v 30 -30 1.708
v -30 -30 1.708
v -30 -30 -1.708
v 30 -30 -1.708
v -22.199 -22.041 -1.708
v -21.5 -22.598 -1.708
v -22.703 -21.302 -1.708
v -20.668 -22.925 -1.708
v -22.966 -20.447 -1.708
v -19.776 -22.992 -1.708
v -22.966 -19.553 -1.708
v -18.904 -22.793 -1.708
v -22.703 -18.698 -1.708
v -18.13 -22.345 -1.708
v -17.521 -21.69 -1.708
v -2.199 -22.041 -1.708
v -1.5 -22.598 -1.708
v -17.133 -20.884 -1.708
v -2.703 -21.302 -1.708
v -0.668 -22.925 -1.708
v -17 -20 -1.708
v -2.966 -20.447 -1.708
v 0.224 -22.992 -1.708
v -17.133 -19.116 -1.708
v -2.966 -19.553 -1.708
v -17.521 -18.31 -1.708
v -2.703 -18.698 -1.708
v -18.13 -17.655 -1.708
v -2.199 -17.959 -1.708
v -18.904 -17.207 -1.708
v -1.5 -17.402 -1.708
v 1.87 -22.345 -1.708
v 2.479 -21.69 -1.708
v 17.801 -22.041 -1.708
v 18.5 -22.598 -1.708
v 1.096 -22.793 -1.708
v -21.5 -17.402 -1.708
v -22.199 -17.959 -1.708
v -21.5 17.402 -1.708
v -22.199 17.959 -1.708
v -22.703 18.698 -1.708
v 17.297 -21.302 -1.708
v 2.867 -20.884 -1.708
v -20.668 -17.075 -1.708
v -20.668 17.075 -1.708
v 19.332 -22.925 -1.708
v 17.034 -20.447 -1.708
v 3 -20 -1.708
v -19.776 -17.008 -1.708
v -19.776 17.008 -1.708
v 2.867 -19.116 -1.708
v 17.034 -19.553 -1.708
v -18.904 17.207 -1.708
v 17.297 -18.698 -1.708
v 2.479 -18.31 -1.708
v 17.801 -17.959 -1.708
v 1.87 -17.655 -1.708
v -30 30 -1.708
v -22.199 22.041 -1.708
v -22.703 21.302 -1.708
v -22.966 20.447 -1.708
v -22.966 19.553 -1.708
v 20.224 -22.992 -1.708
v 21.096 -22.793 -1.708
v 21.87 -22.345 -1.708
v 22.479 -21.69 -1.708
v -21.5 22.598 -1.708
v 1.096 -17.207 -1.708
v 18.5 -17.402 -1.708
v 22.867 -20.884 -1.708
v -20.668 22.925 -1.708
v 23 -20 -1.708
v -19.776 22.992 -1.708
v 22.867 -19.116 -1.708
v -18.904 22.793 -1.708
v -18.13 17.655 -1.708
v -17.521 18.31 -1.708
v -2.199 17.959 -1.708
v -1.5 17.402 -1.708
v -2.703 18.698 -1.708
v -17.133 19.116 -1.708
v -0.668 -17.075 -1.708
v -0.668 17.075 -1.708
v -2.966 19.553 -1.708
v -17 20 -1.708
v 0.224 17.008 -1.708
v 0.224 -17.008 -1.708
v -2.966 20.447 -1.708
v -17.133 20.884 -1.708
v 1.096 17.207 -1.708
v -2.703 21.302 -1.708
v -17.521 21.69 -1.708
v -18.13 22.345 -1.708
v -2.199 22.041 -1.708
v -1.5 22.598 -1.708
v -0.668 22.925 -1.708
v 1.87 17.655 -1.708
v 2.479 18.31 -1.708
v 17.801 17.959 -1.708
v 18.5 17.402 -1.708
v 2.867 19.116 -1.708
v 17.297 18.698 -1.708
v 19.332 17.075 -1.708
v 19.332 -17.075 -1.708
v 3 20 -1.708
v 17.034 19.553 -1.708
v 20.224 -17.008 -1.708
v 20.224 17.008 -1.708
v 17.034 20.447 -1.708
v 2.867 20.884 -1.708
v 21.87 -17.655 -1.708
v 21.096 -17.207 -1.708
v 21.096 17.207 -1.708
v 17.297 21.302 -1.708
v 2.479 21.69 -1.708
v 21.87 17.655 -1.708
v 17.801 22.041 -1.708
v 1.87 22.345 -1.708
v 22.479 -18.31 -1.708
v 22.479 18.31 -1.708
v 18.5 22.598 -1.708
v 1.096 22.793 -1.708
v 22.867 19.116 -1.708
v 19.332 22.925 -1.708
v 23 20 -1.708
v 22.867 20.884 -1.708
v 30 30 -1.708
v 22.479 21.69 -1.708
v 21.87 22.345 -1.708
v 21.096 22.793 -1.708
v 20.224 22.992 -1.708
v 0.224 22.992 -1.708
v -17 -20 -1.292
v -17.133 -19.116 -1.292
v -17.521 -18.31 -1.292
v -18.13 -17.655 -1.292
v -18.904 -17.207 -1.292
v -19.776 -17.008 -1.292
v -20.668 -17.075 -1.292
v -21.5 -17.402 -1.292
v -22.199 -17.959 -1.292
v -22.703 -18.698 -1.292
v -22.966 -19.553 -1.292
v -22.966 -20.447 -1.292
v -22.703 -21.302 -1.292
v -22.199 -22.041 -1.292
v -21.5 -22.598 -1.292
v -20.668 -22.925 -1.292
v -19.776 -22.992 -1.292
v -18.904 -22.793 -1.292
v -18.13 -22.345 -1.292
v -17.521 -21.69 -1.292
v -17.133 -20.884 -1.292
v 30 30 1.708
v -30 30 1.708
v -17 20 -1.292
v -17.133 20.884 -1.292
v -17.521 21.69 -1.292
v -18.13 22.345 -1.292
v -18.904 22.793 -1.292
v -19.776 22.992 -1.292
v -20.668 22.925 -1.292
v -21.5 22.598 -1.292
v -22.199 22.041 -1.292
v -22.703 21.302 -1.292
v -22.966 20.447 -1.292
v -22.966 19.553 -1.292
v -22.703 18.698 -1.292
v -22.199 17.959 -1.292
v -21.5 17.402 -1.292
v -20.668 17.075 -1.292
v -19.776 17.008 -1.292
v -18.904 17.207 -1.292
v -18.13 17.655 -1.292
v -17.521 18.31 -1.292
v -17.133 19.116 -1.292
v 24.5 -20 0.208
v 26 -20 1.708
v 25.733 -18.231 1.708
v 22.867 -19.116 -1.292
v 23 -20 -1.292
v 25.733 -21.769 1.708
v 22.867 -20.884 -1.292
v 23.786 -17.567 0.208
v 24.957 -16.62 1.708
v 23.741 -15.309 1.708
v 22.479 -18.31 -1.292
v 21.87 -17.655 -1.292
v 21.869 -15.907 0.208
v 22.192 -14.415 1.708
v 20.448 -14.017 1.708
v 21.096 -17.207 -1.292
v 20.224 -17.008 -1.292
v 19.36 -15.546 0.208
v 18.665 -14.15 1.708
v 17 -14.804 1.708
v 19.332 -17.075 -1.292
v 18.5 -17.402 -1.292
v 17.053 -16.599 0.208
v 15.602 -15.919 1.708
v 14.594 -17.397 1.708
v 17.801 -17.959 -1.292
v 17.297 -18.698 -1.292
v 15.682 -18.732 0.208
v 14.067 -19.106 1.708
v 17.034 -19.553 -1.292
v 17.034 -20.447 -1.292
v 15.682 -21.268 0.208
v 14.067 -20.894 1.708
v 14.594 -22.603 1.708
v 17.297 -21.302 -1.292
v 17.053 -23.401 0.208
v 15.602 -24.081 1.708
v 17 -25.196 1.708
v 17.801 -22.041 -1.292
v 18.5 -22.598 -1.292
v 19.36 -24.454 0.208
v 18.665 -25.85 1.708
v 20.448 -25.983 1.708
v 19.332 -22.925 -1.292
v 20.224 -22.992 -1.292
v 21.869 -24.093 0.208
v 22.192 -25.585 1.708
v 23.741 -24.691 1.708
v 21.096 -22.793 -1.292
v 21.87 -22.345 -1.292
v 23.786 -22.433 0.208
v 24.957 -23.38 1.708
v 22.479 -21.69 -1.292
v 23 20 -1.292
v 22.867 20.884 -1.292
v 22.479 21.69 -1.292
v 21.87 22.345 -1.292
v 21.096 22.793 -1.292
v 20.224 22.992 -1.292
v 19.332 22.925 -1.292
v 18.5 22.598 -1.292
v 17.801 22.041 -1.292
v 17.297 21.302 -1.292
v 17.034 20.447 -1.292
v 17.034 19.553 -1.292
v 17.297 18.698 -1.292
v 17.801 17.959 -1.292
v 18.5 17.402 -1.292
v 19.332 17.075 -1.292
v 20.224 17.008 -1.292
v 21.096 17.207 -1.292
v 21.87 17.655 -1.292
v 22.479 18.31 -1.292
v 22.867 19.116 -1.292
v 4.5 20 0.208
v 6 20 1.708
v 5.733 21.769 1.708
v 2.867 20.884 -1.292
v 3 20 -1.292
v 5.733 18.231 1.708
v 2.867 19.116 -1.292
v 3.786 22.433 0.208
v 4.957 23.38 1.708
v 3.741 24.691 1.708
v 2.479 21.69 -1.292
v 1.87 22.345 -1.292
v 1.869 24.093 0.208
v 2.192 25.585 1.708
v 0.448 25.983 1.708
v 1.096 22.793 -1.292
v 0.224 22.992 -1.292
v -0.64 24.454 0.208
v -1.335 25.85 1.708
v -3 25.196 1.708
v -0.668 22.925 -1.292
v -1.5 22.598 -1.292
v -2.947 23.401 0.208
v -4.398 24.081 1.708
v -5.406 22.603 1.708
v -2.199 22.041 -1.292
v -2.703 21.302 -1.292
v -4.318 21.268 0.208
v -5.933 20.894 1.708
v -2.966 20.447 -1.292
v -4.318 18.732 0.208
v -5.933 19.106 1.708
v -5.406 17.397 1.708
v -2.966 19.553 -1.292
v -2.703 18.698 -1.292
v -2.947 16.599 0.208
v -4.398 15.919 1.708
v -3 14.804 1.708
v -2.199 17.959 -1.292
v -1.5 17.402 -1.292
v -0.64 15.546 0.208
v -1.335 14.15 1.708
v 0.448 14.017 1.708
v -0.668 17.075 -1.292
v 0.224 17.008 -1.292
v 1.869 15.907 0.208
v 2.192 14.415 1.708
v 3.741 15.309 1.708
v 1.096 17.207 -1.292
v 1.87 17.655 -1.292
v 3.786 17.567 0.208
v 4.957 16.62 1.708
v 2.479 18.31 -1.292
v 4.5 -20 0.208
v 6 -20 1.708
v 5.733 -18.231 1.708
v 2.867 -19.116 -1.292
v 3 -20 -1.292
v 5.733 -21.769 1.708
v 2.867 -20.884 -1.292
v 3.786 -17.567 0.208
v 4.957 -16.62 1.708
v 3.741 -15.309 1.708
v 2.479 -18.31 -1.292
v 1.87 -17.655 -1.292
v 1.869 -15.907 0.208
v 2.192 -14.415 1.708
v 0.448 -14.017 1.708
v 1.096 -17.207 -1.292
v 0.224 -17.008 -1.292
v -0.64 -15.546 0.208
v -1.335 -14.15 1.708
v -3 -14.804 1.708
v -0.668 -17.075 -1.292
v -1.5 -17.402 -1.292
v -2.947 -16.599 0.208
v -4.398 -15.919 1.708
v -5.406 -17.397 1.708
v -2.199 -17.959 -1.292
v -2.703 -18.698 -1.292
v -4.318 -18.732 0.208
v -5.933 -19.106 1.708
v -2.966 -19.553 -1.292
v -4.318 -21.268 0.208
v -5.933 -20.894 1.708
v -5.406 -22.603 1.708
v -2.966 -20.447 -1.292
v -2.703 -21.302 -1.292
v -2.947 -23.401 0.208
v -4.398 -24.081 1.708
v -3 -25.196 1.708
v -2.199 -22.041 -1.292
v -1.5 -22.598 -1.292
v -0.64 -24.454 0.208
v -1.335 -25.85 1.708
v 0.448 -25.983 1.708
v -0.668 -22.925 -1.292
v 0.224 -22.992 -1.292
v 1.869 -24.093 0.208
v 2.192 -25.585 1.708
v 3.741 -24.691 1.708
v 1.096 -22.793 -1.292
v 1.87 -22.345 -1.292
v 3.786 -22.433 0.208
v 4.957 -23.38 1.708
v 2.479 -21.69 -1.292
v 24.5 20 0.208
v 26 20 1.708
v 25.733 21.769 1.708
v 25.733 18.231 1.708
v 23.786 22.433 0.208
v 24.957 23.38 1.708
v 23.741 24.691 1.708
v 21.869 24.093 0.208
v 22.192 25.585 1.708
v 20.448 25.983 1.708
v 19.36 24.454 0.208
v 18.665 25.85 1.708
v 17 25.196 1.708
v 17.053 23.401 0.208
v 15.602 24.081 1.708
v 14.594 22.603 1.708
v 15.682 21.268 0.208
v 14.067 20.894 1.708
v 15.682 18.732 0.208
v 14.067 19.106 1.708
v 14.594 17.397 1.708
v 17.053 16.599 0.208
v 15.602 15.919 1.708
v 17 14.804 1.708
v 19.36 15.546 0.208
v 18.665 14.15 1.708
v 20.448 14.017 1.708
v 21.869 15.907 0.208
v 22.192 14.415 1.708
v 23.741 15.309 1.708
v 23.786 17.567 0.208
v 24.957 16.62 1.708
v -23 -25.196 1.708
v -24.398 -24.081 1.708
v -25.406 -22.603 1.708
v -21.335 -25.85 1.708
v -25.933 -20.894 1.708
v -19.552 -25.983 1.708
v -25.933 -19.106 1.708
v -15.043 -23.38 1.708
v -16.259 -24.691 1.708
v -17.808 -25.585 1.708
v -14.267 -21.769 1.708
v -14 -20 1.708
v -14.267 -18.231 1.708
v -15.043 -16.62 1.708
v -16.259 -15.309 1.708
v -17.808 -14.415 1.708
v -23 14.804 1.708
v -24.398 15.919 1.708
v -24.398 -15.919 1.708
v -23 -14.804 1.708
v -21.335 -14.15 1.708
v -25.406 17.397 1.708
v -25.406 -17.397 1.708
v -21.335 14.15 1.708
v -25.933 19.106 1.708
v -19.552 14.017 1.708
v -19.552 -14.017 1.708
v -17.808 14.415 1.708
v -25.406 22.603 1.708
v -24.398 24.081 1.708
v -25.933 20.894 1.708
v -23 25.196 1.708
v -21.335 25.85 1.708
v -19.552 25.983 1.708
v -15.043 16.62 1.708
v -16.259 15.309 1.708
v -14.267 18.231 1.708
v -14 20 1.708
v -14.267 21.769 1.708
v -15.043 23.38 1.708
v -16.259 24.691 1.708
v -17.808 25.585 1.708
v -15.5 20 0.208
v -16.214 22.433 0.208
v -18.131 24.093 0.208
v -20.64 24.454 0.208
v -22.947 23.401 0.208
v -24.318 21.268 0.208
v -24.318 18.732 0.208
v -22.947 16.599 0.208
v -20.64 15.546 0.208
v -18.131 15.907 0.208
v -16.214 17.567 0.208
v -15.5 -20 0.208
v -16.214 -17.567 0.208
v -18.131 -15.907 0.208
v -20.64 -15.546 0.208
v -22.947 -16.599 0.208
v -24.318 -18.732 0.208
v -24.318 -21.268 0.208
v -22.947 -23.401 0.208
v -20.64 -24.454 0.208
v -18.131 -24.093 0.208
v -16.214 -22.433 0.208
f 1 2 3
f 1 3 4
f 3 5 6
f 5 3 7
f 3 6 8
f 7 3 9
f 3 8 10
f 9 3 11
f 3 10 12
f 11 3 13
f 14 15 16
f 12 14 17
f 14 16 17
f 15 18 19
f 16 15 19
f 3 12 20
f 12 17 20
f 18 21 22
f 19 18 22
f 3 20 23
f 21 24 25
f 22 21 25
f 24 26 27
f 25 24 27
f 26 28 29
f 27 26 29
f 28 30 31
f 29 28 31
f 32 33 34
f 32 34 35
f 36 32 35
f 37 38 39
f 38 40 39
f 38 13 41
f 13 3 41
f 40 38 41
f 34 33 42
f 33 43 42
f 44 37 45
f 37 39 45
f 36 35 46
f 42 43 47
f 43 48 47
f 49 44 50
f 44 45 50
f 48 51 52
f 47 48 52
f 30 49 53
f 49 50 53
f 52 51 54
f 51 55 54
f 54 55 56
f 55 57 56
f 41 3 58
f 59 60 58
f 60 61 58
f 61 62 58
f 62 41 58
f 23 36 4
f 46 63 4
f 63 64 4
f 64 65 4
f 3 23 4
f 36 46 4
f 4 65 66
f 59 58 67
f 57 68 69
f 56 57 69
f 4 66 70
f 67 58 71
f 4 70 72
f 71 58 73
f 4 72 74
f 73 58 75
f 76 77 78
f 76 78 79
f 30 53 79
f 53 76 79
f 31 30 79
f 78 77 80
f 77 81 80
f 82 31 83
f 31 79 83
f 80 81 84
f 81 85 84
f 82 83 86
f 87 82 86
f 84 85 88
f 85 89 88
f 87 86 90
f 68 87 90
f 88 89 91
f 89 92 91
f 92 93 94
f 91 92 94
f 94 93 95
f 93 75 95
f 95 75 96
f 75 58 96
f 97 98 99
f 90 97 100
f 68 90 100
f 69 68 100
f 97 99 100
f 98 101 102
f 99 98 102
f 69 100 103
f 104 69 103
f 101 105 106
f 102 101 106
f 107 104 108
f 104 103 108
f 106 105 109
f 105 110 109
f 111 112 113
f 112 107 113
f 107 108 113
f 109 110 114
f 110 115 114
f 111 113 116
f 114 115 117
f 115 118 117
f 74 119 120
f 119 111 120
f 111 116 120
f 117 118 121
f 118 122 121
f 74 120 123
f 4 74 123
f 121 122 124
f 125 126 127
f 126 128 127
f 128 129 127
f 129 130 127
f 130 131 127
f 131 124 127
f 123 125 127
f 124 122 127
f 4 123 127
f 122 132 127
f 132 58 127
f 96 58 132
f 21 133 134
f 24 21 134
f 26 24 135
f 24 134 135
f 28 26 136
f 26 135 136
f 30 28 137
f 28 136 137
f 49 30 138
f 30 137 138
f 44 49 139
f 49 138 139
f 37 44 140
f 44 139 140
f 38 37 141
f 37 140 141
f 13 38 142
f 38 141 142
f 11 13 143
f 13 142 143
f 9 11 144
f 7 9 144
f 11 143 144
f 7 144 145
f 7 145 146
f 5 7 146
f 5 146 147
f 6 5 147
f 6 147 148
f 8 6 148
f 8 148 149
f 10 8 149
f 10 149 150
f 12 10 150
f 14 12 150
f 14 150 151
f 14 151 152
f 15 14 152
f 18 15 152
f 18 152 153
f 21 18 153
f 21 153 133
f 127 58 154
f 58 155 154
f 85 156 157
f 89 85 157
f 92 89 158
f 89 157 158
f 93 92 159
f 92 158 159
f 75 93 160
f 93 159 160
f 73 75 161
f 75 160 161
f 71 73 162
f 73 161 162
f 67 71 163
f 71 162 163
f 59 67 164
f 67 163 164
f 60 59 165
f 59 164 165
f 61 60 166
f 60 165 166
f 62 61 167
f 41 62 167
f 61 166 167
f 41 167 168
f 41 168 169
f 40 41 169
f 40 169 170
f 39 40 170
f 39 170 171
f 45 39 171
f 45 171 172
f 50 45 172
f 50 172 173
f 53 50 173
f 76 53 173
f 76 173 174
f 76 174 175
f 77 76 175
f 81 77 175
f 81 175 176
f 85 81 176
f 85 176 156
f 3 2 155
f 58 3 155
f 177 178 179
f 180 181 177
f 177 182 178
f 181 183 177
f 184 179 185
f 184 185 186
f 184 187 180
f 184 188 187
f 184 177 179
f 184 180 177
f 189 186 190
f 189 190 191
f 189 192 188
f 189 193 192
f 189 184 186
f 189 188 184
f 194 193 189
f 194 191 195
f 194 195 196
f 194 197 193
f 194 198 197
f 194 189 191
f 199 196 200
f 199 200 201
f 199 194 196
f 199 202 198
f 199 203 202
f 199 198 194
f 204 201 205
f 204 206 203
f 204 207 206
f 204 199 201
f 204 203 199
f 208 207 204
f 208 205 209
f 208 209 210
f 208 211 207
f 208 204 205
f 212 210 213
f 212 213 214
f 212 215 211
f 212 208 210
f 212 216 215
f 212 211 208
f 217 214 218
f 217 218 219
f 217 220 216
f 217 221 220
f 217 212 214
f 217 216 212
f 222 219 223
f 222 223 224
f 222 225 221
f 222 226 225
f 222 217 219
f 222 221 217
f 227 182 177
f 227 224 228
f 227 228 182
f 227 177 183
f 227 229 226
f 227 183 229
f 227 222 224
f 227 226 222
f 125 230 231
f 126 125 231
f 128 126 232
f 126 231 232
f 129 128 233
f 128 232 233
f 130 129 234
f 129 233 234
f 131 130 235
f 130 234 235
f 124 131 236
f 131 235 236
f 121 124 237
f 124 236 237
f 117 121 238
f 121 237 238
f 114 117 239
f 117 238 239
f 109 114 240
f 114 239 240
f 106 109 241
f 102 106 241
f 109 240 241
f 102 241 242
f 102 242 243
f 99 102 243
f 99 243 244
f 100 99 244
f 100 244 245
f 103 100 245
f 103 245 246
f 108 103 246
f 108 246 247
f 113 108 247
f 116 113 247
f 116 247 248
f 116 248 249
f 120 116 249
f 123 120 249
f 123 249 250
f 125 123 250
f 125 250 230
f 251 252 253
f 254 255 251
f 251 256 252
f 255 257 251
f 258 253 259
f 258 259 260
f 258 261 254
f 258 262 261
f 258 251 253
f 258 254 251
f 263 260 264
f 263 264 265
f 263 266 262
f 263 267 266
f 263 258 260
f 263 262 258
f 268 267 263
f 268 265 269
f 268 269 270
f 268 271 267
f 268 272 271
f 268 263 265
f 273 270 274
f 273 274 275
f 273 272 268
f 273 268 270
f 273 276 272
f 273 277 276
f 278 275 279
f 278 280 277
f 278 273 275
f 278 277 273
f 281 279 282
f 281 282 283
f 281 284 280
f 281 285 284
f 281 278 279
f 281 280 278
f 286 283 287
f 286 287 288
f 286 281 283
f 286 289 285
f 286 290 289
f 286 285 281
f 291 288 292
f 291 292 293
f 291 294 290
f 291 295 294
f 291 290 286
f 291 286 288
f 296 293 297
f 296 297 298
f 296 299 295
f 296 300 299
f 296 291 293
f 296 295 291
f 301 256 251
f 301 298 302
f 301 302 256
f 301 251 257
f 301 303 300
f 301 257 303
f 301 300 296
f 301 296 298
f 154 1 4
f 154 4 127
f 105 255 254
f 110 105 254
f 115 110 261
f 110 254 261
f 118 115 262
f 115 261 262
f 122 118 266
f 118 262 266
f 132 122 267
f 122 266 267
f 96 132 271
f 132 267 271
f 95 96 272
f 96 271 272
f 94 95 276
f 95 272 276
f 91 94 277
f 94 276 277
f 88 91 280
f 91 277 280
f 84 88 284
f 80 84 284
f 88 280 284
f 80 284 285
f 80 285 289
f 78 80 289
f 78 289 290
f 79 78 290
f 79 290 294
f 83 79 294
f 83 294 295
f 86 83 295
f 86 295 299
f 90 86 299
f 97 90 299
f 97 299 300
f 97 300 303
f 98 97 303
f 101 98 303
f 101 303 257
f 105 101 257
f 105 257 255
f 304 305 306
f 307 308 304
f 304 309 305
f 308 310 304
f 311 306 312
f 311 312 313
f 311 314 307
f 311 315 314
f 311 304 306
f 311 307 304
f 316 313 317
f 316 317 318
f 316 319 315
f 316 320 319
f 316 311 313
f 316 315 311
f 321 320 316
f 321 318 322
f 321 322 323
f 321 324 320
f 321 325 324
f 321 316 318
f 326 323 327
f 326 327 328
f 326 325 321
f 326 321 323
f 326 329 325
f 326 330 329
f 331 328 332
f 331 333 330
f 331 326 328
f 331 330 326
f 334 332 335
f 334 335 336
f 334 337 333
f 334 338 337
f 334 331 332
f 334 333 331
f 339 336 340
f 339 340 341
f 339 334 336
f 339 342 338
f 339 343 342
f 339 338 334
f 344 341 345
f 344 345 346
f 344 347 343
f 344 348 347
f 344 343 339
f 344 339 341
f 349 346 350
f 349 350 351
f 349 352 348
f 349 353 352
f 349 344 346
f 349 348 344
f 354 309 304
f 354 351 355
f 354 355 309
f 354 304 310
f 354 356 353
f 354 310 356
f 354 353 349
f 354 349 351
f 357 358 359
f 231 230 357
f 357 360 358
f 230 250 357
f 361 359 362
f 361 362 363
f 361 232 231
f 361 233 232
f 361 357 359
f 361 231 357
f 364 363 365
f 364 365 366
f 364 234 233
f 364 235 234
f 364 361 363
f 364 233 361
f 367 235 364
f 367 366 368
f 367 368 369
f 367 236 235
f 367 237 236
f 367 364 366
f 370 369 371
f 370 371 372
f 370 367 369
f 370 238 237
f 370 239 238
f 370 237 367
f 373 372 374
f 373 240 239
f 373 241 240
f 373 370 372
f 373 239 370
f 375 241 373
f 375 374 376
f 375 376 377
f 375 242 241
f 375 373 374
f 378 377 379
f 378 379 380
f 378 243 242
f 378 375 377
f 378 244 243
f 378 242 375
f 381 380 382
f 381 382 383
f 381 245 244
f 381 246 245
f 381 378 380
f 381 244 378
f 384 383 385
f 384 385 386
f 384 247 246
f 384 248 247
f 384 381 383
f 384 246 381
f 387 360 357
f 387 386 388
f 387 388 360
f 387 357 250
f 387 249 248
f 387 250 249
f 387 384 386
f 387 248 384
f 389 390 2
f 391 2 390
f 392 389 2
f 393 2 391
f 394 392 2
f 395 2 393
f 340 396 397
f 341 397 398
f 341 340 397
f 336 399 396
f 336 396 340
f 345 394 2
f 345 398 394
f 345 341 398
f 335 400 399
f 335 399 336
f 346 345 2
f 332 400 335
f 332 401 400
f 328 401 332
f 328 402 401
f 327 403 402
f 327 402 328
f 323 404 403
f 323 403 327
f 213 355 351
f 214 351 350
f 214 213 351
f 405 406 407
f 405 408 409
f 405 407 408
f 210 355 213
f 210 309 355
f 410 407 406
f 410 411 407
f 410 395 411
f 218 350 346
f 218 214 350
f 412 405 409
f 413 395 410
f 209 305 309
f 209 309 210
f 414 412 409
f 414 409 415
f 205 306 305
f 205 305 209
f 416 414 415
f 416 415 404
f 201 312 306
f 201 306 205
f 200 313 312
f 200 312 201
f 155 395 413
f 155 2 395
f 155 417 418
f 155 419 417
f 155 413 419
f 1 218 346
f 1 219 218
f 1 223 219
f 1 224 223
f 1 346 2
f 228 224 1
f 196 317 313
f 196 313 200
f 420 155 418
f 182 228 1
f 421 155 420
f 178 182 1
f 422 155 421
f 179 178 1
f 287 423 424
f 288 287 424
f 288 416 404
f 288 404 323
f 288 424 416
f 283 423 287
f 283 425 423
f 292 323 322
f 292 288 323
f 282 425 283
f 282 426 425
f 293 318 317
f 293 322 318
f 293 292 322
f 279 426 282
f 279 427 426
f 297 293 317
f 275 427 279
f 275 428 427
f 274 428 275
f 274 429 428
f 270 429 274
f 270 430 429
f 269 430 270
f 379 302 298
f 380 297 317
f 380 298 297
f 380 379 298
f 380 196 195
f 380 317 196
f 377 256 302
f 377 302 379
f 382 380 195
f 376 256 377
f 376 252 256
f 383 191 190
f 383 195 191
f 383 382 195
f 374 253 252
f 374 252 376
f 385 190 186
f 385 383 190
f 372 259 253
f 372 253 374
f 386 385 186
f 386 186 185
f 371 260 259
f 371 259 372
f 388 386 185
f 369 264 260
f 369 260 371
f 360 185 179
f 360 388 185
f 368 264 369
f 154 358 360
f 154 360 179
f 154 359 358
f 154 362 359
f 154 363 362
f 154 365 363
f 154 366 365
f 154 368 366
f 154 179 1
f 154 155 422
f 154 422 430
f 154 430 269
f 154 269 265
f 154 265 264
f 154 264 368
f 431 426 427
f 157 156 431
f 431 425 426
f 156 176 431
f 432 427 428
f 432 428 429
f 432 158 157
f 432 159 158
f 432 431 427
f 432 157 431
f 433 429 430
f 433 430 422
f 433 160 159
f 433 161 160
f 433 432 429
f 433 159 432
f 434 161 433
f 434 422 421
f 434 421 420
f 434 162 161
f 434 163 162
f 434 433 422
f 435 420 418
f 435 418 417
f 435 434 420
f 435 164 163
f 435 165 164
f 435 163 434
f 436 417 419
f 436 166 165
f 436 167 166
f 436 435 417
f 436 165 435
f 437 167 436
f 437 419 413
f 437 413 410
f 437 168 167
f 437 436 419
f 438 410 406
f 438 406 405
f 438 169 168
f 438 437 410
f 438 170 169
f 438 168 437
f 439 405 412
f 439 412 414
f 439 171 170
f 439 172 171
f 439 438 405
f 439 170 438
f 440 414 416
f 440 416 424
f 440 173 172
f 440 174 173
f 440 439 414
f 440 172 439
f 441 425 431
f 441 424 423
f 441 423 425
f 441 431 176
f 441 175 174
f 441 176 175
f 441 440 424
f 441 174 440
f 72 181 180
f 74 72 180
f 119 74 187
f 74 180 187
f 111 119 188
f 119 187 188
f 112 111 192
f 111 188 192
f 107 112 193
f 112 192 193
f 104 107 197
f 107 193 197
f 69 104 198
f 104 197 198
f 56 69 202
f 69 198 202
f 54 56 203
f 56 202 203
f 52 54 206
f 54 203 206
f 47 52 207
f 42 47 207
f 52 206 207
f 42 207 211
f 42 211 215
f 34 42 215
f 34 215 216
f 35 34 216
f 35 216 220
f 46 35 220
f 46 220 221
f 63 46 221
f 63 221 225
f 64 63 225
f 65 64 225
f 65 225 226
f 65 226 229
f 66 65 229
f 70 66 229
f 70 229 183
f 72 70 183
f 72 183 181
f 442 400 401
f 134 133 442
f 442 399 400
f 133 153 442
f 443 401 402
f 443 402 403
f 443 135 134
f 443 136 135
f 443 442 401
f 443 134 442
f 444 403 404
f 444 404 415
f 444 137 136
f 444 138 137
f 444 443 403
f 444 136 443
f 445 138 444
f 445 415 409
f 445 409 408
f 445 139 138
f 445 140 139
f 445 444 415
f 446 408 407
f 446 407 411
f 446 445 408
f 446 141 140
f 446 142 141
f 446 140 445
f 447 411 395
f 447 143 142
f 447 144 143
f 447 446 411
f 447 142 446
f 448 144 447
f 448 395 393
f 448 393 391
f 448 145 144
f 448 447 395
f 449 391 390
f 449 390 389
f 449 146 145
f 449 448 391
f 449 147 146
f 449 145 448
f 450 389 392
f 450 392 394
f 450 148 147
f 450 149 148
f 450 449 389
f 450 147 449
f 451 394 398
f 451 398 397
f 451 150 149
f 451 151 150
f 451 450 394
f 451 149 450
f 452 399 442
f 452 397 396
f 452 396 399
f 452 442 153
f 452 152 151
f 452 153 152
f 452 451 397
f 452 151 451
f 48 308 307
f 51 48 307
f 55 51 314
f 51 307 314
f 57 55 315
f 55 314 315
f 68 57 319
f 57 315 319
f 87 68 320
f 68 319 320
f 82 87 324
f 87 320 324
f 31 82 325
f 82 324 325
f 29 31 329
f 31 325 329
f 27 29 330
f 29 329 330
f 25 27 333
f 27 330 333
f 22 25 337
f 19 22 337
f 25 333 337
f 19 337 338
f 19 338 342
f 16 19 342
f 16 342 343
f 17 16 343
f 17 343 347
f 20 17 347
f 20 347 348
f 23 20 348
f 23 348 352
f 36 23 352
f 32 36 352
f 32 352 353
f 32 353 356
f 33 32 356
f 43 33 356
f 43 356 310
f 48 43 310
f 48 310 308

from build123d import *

# Parameters (mm, degrees)
SKETCH1_W           = 60
SKETCH1_H           = 60
BOSS_EXTRUDE1_DEPTH = 1.708
SKETCH2_R           = 3
CUT_EXTRUDE1_DEPTH  = 4.416
CHAMFER1_SIZE       = 3


with BuildPart() as part:
    # Sketch1 → Boss-Extrude1 (new body, symmetric)
    with BuildSketch(Plane.XY):
        Rectangle(SKETCH1_W, SKETCH1_H)
    extrude(amount=BOSS_EXTRUDE1_DEPTH, both=True)

    # Sketch2 → Cut-Extrude1 (cut, through all)
    with BuildSketch(Plane.XY.offset(1.708)):
        with Locations((0, 20)):
            Circle(SKETCH2_R)
        with Locations((0, -20)):
            Circle(SKETCH2_R)
        with Locations((20, -20)):
            Circle(SKETCH2_R)
        with Locations((-20, -20)):
            Circle(SKETCH2_R)
        with Locations((-20, 20)):
            Circle(SKETCH2_R)
        with Locations((20, 20)):
            Circle(SKETCH2_R)
    extrude(amount=-CUT_EXTRUDE1_DEPTH, mode=Mode.SUBTRACT)

    # Chamfer1
    chamfer1_edges = [part.edges().sort_by_distance(p)[0] for p in [
        (-3, -20, 1.708),
        (17, -20, 1.708),
        (-23, -20, 1.708),
        (-23, 20, 1.708),
        (17, 20, 1.708),
        (-3, 20, 1.708),
    ]]
    chamfer(chamfer1_edges, length=CHAMFER1_SIZE)


solid = part.part
